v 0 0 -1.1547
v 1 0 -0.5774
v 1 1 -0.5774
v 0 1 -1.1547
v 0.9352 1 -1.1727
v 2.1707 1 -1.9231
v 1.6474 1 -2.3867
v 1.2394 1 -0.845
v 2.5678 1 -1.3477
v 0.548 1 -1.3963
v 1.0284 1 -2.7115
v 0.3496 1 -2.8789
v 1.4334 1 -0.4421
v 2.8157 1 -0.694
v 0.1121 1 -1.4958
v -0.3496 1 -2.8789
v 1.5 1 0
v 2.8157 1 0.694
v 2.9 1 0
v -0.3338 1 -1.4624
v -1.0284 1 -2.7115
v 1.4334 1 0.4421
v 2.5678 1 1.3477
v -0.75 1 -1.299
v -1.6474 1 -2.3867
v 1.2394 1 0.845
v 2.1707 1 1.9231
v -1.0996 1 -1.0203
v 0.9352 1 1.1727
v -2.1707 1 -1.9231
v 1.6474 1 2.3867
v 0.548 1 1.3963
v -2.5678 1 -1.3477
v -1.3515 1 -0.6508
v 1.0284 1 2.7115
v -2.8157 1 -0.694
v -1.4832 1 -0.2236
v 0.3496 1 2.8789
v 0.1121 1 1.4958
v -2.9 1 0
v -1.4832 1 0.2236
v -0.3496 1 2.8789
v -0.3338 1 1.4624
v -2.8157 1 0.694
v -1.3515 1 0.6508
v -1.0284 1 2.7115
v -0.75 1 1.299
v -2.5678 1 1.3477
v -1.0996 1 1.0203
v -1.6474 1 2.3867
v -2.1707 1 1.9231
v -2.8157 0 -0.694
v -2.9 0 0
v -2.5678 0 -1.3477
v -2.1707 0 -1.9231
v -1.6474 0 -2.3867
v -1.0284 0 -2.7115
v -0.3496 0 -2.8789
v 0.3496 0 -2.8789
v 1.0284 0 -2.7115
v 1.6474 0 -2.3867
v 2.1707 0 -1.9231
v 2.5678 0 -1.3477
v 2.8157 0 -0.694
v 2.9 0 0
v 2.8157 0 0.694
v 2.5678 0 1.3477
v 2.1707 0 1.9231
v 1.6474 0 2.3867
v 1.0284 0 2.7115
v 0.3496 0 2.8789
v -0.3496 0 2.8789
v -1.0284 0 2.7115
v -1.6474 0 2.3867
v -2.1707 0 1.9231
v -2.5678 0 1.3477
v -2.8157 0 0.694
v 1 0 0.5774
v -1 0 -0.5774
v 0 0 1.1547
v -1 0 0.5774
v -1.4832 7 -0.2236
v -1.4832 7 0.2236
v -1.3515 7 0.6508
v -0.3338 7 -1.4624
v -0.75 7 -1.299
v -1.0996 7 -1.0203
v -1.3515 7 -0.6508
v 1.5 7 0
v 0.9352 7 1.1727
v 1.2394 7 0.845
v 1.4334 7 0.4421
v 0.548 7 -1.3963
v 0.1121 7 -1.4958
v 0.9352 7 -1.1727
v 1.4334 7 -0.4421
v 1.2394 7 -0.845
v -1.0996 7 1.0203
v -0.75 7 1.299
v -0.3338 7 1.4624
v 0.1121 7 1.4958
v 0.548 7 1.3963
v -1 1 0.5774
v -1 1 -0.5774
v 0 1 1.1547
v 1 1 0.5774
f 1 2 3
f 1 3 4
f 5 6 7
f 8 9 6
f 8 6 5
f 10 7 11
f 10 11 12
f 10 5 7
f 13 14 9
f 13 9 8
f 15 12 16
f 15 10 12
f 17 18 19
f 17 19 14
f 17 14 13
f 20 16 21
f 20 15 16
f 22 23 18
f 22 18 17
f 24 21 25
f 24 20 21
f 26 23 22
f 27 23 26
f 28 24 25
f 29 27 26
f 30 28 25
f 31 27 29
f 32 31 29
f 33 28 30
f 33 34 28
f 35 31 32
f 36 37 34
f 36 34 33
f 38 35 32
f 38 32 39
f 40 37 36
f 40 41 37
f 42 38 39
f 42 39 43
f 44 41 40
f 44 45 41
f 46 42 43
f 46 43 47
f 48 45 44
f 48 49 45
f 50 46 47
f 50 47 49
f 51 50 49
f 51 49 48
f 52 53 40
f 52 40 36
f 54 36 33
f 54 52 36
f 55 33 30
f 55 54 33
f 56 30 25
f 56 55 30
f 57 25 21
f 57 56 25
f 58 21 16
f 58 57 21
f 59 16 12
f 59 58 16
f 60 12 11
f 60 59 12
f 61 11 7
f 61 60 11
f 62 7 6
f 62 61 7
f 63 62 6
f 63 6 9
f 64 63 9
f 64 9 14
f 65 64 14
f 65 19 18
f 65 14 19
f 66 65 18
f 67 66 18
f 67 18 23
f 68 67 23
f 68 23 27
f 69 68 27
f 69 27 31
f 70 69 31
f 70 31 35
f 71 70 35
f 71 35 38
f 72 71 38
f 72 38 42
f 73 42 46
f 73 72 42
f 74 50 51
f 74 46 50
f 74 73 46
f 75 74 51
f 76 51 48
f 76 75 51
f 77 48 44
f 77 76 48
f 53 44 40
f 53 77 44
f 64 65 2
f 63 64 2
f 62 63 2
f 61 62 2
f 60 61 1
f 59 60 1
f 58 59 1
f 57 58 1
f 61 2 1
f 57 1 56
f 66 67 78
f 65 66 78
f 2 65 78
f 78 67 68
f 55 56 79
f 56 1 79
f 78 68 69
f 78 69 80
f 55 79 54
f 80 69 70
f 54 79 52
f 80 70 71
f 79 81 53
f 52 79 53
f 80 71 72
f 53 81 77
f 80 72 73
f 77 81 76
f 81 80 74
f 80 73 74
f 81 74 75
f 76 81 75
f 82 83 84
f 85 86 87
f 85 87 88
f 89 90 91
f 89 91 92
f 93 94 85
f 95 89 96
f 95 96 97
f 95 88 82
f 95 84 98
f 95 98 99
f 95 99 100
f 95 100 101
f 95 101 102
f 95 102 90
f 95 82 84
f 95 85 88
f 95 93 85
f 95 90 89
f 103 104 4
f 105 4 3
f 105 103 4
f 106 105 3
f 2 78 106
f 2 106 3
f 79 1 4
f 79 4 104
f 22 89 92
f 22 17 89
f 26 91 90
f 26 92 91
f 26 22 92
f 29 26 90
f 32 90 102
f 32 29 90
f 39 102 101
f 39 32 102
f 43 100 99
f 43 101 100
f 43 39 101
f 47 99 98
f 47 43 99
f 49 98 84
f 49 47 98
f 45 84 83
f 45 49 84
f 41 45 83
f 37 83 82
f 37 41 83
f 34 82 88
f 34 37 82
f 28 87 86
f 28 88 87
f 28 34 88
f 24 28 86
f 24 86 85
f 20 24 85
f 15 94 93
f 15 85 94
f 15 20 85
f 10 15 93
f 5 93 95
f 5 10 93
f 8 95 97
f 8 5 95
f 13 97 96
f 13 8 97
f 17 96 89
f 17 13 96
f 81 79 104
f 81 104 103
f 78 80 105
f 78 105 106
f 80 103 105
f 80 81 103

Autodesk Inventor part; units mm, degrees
ref_plane "YZ Plane" through (0, 0, 0) normal (1, 0, 0) x (0, 1, 0)
ref_plane "XZ Plane" through (0, 0, 0) normal (0, 1, 0) x (-1, 0, 0)
ref_plane "XY Plane" through (0, 0, 0) normal (0, 0, 1) x (1, 0, 0)
sketch "Sketch1" plane through (0, 0, 0) normal (0, 1, 0) x (-1, 0, 0)
  circle A0 centre (0, 0) radius 2.9
  dimension "d0" = 5.8
extrude "Extrusion1" add sketch "Sketch1" along normal blind 1
sketch "Sketch2" plane through (0, 1, 0) normal (0, 1, 0) x (1, 0, 0)
  circle A0 centre (0, 0) radius 1.5
  dimension "d3" = 3
extrude "Extrusion2" add sketch "Sketch2" along normal blind 6
sketch "Sketch3" plane through (0, 0, 0) normal (0, -1, 0) x (1, 0, 0)
  line L0 (0, -1.1547) -> (-1, -0.5774)
  line L1 (-1, -0.5774) -> (-1, 0.5774)
  line L2 (-1, 0.5774) -> (0, 1.1547)
  line L3 (0, 1.1547) -> (1, 0.5774)
  line L4 (1, 0.5774) -> (1, -0.5774)
  line L5 (1, -0.5774) -> (0, -1.1547)
  point P0 (0, 0)
  point P1 (0, 0)
  dimension "d6" = 2
extrude "Extrusion3" cut sketch "Sketch3" against normal blind 1
properties part number "m3_bolt_pan_8mm" material "Stainless Steel"
